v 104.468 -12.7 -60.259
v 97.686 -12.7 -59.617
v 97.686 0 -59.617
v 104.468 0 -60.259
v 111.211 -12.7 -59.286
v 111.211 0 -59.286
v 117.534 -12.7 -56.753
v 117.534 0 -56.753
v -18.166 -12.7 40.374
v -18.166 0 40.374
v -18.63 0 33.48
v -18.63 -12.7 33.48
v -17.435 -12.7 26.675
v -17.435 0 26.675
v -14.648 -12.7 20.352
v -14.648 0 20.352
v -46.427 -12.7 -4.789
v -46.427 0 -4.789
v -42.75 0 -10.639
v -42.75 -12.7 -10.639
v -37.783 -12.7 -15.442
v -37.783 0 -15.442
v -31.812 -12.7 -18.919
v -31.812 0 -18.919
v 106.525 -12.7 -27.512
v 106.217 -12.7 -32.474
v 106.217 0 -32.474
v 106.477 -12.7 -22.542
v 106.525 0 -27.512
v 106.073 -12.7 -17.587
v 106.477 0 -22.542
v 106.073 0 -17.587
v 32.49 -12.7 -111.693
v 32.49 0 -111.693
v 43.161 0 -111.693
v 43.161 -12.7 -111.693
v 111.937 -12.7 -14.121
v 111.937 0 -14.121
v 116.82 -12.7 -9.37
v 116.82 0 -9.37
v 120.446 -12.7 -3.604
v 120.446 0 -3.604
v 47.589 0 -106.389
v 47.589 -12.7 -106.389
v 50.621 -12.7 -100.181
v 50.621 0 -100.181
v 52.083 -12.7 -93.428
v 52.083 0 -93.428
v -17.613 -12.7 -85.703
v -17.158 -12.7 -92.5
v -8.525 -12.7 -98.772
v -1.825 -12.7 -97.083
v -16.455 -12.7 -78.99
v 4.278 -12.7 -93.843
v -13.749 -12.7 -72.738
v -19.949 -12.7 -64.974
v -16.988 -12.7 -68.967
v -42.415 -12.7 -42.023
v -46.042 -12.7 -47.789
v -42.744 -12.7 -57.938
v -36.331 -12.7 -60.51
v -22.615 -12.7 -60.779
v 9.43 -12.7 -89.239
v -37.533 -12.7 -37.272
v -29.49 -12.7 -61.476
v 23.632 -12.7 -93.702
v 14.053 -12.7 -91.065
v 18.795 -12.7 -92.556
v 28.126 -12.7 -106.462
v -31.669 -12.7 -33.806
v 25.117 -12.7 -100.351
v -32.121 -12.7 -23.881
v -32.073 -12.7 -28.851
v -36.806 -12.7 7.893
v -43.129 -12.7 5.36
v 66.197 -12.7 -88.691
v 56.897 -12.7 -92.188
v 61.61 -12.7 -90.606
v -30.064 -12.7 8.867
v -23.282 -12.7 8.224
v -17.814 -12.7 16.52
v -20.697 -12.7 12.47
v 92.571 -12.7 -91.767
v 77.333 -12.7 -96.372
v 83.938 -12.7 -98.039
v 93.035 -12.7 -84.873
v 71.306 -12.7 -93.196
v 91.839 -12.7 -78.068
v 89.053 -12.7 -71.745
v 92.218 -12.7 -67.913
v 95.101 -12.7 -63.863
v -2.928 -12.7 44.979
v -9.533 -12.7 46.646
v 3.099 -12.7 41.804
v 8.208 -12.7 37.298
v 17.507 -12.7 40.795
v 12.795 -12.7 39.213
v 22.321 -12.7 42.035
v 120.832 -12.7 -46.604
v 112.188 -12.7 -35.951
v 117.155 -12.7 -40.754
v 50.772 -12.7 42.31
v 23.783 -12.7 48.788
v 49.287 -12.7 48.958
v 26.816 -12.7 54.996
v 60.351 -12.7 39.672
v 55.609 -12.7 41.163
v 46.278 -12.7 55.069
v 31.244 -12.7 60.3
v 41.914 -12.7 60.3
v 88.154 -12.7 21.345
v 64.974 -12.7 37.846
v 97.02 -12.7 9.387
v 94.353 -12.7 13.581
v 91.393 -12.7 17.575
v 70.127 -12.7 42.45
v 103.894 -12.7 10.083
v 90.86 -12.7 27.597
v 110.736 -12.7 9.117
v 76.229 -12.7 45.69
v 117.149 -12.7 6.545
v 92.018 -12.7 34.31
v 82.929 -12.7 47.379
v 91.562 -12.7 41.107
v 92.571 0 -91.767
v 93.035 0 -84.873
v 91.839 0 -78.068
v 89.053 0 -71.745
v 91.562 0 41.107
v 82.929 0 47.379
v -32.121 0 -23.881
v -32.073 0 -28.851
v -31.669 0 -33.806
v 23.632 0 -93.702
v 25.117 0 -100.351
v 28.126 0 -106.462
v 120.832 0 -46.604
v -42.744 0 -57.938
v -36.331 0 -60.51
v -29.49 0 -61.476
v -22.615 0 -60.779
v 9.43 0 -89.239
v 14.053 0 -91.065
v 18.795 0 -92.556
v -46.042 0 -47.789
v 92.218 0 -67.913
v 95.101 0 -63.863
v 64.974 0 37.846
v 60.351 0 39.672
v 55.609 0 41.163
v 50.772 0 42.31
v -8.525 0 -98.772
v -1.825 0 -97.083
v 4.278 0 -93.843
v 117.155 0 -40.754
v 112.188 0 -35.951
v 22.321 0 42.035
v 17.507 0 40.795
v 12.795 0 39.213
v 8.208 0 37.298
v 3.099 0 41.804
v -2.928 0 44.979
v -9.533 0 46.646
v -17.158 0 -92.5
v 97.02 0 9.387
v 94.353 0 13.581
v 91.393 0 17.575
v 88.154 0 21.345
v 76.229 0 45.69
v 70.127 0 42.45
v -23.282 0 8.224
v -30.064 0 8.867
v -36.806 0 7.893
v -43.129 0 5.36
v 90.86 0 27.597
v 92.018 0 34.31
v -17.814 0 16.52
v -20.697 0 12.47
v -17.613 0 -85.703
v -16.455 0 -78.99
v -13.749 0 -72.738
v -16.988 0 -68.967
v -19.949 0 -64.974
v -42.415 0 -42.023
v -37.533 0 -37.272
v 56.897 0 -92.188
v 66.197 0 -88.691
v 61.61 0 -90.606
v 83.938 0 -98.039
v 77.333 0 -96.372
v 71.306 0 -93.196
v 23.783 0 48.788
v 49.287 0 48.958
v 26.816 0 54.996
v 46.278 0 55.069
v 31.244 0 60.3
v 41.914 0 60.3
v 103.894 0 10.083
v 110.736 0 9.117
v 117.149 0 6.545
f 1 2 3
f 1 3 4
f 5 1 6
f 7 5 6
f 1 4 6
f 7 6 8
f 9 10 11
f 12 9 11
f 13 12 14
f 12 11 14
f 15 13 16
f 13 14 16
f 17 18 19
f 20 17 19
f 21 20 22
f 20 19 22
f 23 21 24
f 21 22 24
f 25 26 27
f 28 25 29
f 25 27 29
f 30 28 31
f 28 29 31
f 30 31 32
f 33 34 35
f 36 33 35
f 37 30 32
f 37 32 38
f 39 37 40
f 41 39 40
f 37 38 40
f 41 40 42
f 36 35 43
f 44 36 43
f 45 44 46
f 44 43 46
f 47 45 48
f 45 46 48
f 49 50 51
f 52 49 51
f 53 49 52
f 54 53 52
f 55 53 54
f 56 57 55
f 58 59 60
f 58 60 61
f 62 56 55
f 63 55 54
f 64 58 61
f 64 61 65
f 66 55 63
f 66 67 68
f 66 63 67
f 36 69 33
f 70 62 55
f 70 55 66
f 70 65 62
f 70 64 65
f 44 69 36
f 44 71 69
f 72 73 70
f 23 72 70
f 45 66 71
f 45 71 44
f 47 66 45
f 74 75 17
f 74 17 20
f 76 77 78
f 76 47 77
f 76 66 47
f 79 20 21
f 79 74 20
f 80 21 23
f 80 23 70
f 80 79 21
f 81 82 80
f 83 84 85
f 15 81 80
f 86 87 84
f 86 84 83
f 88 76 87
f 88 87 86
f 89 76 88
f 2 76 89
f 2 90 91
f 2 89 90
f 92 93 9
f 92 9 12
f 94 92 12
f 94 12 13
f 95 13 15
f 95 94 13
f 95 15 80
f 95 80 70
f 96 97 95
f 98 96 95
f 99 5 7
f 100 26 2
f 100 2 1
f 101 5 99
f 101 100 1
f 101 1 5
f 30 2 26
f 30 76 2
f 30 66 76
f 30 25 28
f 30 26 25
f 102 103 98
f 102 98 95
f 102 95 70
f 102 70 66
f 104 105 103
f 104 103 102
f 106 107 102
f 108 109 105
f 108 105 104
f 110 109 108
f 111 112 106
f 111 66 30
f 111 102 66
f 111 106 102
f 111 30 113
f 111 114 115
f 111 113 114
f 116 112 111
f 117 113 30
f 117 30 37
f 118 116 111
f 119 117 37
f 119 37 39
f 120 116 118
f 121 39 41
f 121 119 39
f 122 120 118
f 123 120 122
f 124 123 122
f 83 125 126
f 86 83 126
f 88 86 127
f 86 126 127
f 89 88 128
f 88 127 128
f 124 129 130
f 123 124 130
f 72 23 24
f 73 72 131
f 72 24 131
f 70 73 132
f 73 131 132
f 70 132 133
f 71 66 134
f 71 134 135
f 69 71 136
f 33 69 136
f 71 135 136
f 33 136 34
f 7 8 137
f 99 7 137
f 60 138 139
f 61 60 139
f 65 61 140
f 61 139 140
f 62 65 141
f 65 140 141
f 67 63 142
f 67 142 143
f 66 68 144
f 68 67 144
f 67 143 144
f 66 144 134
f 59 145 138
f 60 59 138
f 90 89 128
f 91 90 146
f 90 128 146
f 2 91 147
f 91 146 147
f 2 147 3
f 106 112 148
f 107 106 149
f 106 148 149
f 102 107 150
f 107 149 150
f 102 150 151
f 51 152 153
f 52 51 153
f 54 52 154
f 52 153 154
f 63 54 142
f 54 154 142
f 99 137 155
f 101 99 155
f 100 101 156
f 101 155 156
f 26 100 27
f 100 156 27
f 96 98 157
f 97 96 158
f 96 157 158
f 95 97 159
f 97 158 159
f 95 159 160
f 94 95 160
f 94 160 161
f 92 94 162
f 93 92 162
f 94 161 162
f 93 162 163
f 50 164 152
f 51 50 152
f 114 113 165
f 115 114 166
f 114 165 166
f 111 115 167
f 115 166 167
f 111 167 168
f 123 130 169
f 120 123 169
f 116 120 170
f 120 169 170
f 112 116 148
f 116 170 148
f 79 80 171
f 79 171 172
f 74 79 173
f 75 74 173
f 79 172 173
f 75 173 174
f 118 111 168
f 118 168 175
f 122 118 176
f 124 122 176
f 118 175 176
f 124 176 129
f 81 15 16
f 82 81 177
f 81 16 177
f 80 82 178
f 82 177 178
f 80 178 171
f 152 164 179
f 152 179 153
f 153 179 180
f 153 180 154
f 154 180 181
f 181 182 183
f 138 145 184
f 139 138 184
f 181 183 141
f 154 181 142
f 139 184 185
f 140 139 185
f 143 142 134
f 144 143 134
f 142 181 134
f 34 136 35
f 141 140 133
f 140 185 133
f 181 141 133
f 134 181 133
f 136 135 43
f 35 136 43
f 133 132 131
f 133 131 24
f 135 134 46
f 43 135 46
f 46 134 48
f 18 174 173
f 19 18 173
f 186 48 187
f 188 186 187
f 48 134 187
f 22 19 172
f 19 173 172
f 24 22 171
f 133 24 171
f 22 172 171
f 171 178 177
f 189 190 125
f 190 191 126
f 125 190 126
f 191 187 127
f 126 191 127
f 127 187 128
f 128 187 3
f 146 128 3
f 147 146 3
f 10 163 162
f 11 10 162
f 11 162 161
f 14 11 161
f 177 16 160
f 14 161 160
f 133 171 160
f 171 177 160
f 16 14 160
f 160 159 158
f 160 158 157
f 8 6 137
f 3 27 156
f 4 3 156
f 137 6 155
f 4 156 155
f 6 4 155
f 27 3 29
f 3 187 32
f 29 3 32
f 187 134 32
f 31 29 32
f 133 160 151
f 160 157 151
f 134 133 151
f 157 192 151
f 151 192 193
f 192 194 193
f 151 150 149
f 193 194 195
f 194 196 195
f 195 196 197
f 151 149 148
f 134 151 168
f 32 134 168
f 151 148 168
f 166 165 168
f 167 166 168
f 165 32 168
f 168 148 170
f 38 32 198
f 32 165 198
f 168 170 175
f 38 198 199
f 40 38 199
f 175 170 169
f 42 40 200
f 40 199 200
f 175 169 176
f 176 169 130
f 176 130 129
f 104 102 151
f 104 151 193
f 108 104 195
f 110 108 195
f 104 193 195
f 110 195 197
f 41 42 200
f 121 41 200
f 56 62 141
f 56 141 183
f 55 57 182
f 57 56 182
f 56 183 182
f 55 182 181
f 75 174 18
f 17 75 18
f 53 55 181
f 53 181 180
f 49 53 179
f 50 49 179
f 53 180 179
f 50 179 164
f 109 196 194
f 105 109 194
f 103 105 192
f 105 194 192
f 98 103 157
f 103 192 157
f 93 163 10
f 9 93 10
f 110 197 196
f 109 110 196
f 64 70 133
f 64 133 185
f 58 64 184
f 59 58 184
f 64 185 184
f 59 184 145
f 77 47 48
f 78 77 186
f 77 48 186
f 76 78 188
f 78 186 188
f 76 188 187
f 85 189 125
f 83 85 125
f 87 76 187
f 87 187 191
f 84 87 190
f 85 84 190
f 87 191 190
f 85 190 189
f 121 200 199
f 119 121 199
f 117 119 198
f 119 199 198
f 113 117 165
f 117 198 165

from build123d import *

# Parameters (mm, degrees)
F2_DEPTH = 12.7
F1_R     = 69.346694
F3_DEPTH = 12.7
F4_COUNT = 10


with BuildPart() as f2:
    # F0 (on Front) → F2 (new body)
    with BuildSketch(Plane.XZ):
        with BuildLine():
            Line((22.197887, 39.416865), (50.918356, 39.377556))
            ThreePointArc((50.918356, 39.377556), (48.579291, 50.769767), (41.914459, 60.300438))
            Line((41.914459, 60.300438), (31.243502, 60.300438))
            ThreePointArc((31.243502, 60.300438), (24.563893, 50.792859), (22.197887, 39.416865))
        make_face()
    extrude(amount=F2_DEPTH)

    # F1 (on Front) → F3 (join)
    with BuildSketch(Plane.XZ):
        with Locations((37.202269, -25.696449)):
            Circle(F1_R)
    extrude(amount=F3_DEPTH)

    # F4: F2 ×10 about axis
    f4_axis = Axis((37.202269, 0, -25.696449), (0, 1, 0))


with BuildPart() as f2_1:
    add(f2.part)
    for i in range(1, F4_COUNT):
        add(f2.part.rotate(f4_axis, i * 360 / F4_COUNT))


solid = f2_1.part
